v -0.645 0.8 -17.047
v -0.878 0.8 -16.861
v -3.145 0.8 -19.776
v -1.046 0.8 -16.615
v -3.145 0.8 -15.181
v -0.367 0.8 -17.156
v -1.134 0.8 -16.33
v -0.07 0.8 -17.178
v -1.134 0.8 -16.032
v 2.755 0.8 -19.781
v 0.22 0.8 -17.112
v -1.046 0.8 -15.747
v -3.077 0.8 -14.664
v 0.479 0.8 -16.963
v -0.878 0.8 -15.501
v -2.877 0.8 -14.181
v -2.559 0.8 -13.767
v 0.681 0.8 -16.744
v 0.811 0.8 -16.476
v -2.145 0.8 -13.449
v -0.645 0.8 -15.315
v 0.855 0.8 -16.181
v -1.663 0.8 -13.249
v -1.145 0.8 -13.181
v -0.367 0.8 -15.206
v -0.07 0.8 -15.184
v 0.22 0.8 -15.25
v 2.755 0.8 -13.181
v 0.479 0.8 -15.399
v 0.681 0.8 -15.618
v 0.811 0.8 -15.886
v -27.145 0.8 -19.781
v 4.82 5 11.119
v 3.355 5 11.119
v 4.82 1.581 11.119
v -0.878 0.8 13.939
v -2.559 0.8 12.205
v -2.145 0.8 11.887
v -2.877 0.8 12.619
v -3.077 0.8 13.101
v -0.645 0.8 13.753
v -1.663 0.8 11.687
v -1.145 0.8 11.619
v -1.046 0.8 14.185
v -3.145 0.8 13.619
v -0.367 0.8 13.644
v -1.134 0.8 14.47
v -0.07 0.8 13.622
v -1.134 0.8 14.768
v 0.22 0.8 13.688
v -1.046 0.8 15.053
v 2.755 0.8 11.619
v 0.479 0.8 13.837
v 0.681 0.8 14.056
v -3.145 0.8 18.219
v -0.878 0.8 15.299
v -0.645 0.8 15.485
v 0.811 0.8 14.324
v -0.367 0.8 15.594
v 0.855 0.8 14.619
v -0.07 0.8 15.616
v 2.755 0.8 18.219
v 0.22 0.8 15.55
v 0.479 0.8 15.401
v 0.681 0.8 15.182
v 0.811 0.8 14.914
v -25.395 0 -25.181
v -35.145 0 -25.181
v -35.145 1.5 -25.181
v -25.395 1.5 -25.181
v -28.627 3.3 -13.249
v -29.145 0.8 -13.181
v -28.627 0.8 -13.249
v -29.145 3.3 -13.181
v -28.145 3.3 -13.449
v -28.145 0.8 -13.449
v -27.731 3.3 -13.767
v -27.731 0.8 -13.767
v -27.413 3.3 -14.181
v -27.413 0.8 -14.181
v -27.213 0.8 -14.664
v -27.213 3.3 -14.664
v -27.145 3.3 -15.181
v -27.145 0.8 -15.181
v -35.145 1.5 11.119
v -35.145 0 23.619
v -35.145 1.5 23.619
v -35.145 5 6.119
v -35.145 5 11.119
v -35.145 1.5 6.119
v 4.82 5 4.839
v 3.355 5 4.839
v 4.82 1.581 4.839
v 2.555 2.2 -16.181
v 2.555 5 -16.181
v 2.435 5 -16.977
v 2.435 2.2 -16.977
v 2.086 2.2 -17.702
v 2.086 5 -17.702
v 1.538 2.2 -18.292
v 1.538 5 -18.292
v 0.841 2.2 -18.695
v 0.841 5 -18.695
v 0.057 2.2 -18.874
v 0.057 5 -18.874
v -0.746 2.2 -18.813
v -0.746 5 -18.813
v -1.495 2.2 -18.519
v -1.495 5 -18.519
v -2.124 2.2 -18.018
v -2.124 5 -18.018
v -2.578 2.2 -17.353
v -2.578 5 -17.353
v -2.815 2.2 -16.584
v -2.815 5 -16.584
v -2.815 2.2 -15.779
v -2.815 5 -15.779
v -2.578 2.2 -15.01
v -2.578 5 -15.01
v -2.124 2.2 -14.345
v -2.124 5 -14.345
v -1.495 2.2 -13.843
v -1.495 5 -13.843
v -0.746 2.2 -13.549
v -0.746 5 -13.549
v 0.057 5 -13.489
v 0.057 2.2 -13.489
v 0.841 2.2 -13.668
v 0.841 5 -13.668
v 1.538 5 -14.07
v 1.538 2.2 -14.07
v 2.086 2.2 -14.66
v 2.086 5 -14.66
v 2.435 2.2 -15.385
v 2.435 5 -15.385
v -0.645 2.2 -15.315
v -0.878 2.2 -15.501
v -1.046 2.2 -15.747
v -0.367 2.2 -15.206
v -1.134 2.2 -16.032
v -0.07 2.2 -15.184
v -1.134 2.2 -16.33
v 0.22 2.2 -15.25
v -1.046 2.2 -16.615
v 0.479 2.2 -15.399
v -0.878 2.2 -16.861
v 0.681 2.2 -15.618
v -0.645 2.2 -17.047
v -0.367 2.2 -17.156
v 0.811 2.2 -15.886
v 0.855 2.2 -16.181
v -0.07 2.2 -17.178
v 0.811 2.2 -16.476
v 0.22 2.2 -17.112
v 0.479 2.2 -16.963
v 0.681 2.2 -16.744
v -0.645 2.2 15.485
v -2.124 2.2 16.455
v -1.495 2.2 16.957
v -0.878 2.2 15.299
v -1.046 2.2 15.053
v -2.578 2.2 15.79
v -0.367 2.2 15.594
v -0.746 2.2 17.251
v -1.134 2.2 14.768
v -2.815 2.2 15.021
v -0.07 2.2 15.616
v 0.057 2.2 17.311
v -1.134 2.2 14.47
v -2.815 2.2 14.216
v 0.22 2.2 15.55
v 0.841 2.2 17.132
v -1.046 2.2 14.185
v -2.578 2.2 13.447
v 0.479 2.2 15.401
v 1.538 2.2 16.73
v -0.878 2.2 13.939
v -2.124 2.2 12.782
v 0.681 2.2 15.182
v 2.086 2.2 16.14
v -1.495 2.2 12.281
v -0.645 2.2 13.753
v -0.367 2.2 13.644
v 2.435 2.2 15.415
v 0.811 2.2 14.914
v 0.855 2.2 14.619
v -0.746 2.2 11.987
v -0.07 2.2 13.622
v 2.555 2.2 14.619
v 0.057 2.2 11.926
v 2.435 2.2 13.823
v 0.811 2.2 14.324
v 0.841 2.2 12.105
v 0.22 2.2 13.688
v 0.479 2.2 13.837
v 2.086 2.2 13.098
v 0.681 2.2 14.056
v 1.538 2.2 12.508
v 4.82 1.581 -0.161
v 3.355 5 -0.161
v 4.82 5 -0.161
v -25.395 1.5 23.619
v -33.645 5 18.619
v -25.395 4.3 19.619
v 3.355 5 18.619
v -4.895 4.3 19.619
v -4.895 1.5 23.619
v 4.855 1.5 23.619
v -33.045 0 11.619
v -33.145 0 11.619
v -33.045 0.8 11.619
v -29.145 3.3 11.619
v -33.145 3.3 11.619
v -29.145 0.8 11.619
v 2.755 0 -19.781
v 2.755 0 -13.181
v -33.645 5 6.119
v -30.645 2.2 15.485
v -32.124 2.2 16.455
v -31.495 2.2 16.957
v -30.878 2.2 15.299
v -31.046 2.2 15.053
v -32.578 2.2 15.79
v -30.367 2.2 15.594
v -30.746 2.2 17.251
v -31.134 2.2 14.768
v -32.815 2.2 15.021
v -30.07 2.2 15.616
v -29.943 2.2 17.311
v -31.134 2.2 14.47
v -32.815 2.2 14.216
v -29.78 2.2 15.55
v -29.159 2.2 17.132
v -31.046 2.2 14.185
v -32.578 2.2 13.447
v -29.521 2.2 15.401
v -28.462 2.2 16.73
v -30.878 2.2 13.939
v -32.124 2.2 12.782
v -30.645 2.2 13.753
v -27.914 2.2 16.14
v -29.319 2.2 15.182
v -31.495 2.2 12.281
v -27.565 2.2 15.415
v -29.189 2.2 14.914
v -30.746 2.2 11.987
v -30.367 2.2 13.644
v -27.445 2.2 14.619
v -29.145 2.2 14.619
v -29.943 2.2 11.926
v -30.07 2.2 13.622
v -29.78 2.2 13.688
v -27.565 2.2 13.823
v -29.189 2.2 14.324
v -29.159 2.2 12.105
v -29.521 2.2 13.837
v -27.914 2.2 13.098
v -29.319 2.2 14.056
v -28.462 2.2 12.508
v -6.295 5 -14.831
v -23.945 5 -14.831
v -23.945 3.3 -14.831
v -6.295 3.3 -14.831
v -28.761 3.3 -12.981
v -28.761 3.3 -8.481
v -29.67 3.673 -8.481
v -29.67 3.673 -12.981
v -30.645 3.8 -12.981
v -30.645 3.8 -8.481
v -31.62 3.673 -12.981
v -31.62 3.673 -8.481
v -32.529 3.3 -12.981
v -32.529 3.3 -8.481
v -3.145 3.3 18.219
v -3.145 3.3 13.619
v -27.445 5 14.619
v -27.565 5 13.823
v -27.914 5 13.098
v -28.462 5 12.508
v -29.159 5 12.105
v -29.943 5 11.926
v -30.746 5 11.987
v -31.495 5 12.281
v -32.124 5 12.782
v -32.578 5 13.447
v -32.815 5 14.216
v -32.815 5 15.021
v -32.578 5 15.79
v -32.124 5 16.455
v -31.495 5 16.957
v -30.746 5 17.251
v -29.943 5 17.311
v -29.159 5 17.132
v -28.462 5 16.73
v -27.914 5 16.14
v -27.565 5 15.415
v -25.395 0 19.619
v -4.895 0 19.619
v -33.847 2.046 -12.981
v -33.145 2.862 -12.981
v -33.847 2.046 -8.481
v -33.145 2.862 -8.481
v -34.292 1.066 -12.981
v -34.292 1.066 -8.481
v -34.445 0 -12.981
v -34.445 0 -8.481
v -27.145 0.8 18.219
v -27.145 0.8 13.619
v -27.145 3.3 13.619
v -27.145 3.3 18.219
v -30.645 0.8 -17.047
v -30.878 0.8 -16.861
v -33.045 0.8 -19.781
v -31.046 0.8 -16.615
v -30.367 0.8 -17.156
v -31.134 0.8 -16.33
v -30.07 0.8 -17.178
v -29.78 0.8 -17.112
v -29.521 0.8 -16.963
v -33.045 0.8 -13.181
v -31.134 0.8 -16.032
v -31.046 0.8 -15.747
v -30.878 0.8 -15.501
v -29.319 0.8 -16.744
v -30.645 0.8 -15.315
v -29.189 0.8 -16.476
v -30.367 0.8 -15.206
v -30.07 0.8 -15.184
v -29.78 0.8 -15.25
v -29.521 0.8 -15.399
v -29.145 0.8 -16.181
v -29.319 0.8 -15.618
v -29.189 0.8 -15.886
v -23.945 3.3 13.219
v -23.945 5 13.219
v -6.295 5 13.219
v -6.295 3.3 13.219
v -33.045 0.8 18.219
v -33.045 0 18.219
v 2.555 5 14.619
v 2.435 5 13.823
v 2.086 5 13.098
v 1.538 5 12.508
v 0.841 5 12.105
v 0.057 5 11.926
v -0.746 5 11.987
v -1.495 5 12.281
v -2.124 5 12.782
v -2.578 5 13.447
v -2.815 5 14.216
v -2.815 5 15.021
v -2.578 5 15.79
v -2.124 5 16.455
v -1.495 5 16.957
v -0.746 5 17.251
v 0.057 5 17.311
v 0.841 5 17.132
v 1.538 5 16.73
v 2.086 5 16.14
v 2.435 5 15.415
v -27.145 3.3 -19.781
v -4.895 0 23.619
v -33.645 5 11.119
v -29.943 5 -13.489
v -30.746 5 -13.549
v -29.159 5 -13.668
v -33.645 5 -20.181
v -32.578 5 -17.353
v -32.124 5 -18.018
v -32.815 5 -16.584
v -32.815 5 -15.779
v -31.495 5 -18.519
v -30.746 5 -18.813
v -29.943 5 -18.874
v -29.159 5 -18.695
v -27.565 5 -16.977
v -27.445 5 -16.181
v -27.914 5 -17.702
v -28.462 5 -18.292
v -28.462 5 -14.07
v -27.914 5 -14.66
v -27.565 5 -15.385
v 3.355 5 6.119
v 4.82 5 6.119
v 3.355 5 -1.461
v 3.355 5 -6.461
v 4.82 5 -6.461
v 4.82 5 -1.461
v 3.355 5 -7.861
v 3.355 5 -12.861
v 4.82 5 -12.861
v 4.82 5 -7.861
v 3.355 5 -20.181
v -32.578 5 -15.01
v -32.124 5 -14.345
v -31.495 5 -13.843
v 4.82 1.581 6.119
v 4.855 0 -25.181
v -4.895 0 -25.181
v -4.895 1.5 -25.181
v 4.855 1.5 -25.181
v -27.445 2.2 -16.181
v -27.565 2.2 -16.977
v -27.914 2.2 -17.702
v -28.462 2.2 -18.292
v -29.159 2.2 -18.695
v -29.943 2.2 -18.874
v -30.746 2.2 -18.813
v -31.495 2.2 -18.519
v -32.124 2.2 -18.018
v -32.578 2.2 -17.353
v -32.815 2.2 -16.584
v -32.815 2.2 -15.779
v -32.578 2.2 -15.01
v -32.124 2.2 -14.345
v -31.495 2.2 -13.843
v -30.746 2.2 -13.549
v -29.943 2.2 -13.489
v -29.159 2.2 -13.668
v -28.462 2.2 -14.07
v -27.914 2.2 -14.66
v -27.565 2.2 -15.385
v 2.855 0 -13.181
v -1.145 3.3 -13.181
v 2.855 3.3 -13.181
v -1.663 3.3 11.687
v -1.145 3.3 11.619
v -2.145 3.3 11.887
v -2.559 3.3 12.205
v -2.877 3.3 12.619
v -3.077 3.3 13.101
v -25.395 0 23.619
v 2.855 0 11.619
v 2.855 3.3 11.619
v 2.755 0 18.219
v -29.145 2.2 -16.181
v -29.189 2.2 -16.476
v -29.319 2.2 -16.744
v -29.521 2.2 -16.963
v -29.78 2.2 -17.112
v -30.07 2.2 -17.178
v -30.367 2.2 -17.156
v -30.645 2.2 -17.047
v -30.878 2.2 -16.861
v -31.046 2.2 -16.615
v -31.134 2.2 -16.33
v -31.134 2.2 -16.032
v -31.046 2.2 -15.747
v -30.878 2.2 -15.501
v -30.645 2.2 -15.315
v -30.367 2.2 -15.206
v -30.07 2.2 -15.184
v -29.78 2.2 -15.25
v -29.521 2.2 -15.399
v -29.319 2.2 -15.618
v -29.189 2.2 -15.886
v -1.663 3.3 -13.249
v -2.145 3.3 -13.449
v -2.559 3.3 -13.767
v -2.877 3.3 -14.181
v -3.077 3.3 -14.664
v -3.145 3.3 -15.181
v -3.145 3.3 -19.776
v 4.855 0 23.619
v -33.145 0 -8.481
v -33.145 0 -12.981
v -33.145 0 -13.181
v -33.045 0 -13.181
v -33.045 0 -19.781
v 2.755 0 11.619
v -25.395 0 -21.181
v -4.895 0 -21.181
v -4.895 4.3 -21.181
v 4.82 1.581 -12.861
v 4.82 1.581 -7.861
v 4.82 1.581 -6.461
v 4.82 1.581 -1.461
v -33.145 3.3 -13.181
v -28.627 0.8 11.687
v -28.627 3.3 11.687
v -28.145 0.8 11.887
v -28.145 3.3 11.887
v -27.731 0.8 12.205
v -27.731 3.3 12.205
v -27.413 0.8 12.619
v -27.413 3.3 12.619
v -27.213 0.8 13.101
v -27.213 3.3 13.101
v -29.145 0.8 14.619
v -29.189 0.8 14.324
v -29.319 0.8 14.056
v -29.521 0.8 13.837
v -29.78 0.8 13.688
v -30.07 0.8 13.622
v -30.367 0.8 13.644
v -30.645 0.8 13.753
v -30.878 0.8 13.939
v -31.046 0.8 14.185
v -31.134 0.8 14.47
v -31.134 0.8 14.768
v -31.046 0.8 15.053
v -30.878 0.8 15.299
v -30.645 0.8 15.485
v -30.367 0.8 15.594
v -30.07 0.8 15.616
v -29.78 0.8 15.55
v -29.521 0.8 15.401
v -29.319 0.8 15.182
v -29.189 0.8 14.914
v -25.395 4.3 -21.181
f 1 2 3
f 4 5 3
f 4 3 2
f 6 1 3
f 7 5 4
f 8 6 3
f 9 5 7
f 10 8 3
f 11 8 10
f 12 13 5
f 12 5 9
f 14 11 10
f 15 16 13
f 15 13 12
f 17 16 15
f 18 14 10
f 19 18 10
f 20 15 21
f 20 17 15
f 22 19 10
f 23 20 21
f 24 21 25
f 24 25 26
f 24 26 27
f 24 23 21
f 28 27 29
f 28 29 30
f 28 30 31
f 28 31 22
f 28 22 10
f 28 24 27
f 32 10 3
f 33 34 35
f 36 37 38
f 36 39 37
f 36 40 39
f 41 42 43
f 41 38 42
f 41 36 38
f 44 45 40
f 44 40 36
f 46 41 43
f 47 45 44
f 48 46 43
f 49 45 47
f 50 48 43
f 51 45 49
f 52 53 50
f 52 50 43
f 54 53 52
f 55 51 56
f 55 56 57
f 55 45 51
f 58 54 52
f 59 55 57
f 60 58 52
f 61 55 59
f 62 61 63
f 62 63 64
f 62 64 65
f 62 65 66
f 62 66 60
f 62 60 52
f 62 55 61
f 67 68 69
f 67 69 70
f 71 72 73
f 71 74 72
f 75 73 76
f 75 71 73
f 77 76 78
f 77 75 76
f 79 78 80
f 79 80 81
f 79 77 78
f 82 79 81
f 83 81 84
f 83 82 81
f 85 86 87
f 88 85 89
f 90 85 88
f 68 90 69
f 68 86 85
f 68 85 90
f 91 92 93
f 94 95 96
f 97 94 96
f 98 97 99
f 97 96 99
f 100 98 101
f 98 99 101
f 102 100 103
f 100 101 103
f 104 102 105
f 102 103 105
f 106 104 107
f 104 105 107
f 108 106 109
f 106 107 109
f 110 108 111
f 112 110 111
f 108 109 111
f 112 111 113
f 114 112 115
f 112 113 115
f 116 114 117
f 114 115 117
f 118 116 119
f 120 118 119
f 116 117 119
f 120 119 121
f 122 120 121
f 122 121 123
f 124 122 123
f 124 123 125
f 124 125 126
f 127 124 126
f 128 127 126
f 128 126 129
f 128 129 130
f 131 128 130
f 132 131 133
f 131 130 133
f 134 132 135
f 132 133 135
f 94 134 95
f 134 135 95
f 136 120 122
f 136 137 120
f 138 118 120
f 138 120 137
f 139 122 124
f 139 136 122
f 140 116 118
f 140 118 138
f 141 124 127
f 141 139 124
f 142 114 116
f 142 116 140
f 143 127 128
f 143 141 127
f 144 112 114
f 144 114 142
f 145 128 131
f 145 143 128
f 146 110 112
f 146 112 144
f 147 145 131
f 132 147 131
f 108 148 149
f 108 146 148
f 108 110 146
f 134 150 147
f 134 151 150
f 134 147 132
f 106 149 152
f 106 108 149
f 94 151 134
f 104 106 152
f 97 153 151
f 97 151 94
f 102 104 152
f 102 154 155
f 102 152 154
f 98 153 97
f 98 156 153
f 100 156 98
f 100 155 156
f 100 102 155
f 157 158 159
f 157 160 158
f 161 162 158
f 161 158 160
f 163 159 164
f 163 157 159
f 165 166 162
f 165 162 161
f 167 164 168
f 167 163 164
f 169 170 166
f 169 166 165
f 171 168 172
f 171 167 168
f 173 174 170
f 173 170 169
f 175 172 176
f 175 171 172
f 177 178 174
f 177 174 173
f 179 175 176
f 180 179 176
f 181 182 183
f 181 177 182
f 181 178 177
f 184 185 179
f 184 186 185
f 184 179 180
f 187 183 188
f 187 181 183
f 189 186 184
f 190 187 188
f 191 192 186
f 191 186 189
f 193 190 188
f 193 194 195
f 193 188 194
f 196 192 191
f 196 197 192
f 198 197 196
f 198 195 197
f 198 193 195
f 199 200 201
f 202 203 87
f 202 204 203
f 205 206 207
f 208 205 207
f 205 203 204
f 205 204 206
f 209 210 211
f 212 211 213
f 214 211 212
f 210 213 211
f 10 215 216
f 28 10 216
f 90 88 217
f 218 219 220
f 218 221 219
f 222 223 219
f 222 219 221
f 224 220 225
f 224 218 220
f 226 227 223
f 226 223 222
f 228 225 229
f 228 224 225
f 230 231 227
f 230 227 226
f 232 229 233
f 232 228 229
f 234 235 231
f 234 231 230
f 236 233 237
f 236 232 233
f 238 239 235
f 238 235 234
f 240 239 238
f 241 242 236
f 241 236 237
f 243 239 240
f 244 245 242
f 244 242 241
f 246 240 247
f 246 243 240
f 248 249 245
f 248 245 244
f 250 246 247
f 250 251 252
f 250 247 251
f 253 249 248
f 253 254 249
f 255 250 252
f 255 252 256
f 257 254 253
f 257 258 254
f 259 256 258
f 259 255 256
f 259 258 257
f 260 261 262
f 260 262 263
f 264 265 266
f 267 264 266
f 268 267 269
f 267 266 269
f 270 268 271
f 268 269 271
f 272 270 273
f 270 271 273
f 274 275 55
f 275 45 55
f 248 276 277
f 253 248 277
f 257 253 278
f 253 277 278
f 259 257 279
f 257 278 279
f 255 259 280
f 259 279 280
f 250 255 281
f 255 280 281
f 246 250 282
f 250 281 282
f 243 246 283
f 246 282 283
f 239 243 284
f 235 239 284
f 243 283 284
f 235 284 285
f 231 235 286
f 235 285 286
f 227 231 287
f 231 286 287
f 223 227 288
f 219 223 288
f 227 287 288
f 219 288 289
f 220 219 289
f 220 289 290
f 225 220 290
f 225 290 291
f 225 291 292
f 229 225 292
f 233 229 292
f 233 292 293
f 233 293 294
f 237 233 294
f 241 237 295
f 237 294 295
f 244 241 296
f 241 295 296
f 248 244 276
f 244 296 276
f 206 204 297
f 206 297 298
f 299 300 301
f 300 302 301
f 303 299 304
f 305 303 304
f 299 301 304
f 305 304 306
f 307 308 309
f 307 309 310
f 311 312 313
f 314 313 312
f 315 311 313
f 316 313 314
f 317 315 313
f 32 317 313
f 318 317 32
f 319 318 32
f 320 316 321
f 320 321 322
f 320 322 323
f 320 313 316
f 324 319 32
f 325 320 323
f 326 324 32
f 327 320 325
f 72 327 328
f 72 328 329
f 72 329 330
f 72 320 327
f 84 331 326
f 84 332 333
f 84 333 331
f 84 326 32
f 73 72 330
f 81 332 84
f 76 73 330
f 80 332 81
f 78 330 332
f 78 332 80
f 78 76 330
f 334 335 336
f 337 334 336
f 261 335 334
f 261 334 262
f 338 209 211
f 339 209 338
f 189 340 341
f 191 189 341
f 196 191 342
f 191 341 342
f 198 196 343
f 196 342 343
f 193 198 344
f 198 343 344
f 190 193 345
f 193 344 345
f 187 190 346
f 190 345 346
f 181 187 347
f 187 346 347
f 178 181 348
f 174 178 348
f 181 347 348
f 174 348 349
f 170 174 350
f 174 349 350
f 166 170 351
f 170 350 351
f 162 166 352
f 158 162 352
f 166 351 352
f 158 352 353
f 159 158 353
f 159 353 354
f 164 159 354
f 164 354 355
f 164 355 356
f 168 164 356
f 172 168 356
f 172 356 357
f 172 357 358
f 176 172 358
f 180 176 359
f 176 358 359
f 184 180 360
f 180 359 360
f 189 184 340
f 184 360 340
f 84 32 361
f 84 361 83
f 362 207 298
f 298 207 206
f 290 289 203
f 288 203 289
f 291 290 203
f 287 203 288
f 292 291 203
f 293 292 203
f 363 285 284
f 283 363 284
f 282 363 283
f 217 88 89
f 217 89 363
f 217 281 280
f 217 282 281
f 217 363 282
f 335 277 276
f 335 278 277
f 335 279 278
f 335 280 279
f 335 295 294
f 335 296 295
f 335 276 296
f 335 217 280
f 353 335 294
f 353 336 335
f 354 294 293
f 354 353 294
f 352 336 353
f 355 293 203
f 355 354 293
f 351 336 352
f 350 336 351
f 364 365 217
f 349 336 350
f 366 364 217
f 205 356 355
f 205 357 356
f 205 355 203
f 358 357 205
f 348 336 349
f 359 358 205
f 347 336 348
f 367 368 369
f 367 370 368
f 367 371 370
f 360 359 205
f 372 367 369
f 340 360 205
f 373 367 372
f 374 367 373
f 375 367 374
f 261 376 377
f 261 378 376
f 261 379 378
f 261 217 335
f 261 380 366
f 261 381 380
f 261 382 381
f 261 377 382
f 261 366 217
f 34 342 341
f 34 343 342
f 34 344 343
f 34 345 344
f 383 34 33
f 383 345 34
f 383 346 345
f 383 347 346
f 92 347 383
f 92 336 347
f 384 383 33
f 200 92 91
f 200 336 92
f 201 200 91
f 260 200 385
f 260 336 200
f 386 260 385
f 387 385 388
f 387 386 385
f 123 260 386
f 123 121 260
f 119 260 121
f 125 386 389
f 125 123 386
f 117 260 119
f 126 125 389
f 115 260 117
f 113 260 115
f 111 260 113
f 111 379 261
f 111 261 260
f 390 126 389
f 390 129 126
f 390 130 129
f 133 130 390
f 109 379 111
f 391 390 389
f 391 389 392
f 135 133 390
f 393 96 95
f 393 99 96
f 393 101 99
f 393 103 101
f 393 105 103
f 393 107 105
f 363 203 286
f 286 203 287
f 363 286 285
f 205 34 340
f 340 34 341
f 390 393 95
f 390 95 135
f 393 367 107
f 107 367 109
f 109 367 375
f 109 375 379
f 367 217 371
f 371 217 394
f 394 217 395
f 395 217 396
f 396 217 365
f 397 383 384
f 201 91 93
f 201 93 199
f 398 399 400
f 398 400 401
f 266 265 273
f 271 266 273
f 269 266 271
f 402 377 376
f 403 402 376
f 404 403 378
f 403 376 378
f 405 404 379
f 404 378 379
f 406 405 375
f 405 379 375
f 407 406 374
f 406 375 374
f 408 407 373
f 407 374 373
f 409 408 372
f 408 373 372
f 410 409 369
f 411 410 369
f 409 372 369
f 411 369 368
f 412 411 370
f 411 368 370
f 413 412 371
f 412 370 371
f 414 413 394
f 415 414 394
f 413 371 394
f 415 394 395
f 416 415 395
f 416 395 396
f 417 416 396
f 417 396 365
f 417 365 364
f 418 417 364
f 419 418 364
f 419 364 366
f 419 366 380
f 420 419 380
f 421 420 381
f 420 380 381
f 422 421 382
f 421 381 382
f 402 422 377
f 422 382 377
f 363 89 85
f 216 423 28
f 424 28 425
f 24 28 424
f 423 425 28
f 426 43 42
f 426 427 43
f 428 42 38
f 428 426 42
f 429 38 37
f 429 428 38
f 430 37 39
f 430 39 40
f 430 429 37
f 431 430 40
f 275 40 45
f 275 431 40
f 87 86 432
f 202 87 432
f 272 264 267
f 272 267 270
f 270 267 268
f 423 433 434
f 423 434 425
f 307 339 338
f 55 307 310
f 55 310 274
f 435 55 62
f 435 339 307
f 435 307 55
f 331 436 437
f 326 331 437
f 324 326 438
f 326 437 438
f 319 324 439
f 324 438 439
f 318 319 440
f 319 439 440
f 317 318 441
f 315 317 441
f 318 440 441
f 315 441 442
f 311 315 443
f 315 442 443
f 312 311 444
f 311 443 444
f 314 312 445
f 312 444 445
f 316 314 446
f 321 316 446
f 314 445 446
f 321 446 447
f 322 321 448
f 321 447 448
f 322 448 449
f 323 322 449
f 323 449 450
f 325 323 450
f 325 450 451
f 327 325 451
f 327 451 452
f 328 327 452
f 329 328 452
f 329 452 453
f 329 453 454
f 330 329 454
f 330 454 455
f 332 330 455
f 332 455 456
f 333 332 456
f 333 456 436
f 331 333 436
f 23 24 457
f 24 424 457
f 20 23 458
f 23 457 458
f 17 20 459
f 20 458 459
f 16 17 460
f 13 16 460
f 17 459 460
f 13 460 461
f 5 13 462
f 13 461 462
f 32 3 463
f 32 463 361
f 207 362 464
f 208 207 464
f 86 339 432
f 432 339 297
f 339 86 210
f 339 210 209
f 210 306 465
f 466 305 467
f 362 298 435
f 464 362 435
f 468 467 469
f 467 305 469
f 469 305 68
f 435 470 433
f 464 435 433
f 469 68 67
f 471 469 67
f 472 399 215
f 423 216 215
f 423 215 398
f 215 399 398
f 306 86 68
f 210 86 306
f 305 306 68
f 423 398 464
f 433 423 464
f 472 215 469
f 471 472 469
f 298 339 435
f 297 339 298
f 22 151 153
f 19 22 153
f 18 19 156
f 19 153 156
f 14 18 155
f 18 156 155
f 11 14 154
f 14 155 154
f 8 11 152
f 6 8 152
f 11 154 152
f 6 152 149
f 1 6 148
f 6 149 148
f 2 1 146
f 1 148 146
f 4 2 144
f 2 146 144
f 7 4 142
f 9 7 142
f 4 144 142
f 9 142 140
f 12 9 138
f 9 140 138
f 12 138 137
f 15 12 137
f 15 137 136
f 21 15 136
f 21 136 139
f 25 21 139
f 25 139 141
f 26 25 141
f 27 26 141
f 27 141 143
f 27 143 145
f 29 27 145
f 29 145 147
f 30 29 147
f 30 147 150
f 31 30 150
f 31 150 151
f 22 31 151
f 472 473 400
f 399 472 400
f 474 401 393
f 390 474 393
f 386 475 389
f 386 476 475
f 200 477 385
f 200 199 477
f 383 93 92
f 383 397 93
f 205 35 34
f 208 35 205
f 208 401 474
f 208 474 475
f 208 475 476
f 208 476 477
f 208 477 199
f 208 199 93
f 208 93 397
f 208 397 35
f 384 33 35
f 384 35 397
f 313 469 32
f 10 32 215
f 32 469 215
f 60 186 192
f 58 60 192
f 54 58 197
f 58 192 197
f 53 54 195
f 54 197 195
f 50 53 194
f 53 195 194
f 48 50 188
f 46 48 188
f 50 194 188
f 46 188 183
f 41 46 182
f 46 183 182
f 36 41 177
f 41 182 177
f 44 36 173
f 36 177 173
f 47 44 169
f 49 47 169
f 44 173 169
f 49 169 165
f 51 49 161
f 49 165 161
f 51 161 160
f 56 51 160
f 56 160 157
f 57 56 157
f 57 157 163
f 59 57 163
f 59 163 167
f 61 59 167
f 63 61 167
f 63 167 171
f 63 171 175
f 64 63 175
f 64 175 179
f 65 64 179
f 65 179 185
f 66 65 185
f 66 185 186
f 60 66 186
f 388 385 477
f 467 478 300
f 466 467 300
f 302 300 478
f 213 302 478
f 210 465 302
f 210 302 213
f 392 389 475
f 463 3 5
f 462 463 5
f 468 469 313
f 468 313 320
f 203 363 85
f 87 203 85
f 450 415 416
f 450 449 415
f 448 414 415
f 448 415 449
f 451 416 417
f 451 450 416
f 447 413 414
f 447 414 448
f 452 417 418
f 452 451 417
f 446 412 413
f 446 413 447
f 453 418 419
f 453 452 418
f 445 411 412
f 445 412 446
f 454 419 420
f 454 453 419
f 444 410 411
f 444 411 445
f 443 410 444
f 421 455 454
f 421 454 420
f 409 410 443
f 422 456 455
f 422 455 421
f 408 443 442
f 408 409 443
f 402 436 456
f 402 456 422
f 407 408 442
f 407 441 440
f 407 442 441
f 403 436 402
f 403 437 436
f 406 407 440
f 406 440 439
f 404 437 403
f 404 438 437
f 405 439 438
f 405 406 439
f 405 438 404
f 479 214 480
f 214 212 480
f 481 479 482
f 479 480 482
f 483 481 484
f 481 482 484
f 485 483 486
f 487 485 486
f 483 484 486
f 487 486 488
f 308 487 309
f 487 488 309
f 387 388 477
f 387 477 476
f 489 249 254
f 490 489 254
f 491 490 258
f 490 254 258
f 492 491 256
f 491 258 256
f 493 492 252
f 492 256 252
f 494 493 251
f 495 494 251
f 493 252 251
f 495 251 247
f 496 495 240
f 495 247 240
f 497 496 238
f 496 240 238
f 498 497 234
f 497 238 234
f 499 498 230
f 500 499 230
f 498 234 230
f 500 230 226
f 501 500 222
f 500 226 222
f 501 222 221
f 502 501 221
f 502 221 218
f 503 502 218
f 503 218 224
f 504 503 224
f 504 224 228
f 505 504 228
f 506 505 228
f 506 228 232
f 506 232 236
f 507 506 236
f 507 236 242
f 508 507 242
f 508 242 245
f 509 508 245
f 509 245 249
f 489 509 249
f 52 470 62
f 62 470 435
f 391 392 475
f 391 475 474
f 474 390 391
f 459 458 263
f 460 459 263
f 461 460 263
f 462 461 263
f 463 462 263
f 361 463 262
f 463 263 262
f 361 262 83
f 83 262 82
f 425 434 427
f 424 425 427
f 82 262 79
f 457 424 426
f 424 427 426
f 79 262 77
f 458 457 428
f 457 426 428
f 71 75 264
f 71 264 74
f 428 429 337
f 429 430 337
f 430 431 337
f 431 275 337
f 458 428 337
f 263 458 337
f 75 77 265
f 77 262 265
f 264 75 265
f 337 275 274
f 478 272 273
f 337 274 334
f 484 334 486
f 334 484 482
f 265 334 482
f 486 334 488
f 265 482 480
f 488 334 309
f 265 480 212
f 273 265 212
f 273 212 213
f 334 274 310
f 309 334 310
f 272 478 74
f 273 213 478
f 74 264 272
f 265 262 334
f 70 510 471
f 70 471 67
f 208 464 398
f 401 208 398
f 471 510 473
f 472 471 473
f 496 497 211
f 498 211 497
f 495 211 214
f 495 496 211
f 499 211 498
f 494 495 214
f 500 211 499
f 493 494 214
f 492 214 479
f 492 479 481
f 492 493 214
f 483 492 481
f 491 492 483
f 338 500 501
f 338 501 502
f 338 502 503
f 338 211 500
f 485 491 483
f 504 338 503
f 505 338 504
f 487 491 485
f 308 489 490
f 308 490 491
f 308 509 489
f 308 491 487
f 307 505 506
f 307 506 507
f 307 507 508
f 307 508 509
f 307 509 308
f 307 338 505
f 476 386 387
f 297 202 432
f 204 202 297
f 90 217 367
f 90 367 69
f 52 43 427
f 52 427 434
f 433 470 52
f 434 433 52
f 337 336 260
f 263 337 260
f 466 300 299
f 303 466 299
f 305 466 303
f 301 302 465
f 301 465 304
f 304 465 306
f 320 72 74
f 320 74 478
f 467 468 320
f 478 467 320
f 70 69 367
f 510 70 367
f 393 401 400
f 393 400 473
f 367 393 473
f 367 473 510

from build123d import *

# Parameters (mm, degrees)
SKETCH1_W            = 40
SKETCH1_H            = 48.8
BOSS_EXTRUDE1_DEPTH  = 5
SKETCH2_W            = 20.5
SKETCH2_H            = 8
CUT_EXTRUDE1_DEPTH   = 6
SKETCH3_R            = 2.7
CUT_EXTRUDE2_DEPTH   = 2.8
SKETCH5_R            = 1
CUT_EXTRUDE3_DEPTH   = 6
SKETCH6_OUTSIDE_W    = 63.46
SKETCH6_OUTSIDE_H    = 19.66
CUT_EXTRUDE4_DEPTH   = 41
SKETCH7_OUTSIDE_W    = 54.66
SKETCH7_OUTSIDE_H    = 19.66
CUT_EXTRUDE5_DEPTH   = 49.8
SKETCH8_W            = 17.65
SKETCH8_H            = 28.05
CUT_EXTRUDE6_DEPTH   = 6
BOSS_EXTRUDE2_REACH  = 7
SKETCH9_W            = 2.93050761
SKETCH9_H            = 5
SKETCH9_W_2          = 3
SKETCH10_W           = 35.8
SKETCH10_H           = 38
CUT_EXTRUDE7_DEPTH   = 0.8
SKETCH11_W           = 36
SKETCH11_H           = 24
CUT_EXTRUDE8_DEPTH   = 2.8
SKETCH12_W           = 4
SKETCH12_H           = 26.7
CUT_EXTRUDE9_DEPTH   = 3.3
SKETCH13_OUTSIDE_W   = 54.66
SKETCH13_OUTSIDE_H   = 63.46
SKETCH13_OUTSIDE_W_2 = 40
SKETCH13_OUTSIDE_H_2 = 48.8
CUT_EXTRUDE10_DEPTH  = 3.3
SKETCH14_W           = 3.8
SKETCH14_H           = 4.5
FILLET1_R            = 2


with BuildPart() as part:
    # Sketch1 → Boss-Extrude1 (new body)
    with BuildSketch(Plane(origin=(0, 0, 0), x_dir=(1, 0, 0), z_dir=(0, 1, 0))):
        with Locations((-15.144927536, 0.78115942)):
            Rectangle(SKETCH1_W, SKETCH1_H)
    extrude(amount=BOSS_EXTRUDE1_DEPTH)

    # Sketch2 → Cut-Extrude1 (cut, through all)
    with BuildSketch(Plane(origin=(0, 5, 0), x_dir=(1, 0, 0), z_dir=(0, 1, 0))):
        with Locations((-15.144927536, -23.61884058)):
            Rectangle(SKETCH2_W, SKETCH2_H)
        with Locations((-15.144927536, 25.18115942)):
            Rectangle(SKETCH2_W, SKETCH2_H)
    extrude(amount=-CUT_EXTRUDE1_DEPTH, mode=Mode.SUBTRACT)

    # Sketch3 → Cut-Extrude2 (cut)
    with BuildSketch(Plane(origin=(0, 5, 0), x_dir=(1, 0, 0), z_dir=(0, 1, 0))):
        with Locations((-30.144927536, 16.18115942)):
            Circle(SKETCH3_R)
        with Locations((-0.144927536, 16.18115942)):
            Circle(SKETCH3_R)
        with Locations((-30.144927536, -14.61884058)):
            Circle(SKETCH3_R)
        with Locations((-0.144927536, -14.61884058)):
            Circle(SKETCH3_R)
    extrude(amount=-CUT_EXTRUDE2_DEPTH, mode=Mode.SUBTRACT)

    # Sketch5 → Cut-Extrude3 (cut, through all)
    with BuildSketch(Plane(origin=(0, 5, 0), x_dir=(1, 0, 0), z_dir=(0, 1, 0))):
        with Locations((-30.144927536, -14.61884058)):
            Circle(SKETCH5_R)
        with Locations((-0.144927536, -14.61884058)):
            Circle(SKETCH5_R)
        with Locations((-0.144927536, 16.18115942)):
            Circle(SKETCH5_R)
        with Locations((-30.144927536, 16.18115942)):
            Circle(SKETCH5_R)
    extrude(amount=-CUT_EXTRUDE3_DEPTH, mode=Mode.SUBTRACT)

    # Sketch6 outside → Cut-Extrude4 (cut, through all)
    with BuildSketch(Plane(origin=(4.855072464, 0, 0), x_dir=(0, 0, -1), z_dir=(1, 0, 0))):
        with Locations((0.781, 2.5)):
            Rectangle(SKETCH6_OUTSIDE_W, SKETCH6_OUTSIDE_H)
        Polygon((-18.61884058, 5), (-23.61884058, 1.5), (-23.61884058, 0), (25.18115942, 0), (25.18115942, 1.5), (20.18115942, 5), align=None, mode=Mode.SUBTRACT)
    extrude(amount=-CUT_EXTRUDE4_DEPTH, mode=Mode.SUBTRACT)

    # Sketch7 outside → Cut-Extrude5 (cut, through all)
    with BuildSketch(Plane.XY.offset(23.61884058)):
        with Locations((-15.145, 2.5)):
            Rectangle(SKETCH7_OUTSIDE_W, SKETCH7_OUTSIDE_H)
        Polygon((4.855072464, 1.5), (3.355072464, 5), (-33.644927536, 5), (-35.144927536, 1.5), (-35.144927536, 0), (4.855072464, 0), align=None, mode=Mode.SUBTRACT)
    extrude(amount=-CUT_EXTRUDE5_DEPTH, mode=Mode.SUBTRACT)

    # Sketch8 → Cut-Extrude6 (cut, through all)
    with BuildSketch(Plane(origin=(0, 5, 0), x_dir=(1, 0, 0), z_dir=(0, 1, 0))):
        with Locations((-15.119927536, 0.80615942)):
            Rectangle(SKETCH8_W, SKETCH8_H)
    extrude(amount=-CUT_EXTRUDE6_DEPTH, mode=Mode.SUBTRACT)

    # Sketch9 → Boss-Extrude2 (add, up to next)
    with BuildSketch(Plane(origin=(0, 5, 0), x_dir=(1, 0, 0), z_dir=(0, 1, 0)), mode=Mode.PRIVATE) as boss_extrude2_sk1:
        with Locations((3.355072464, 10.36115942)):
            Rectangle(SKETCH9_W, SKETCH9_H)
    boss_extrude2_tool1 = extrude(boss_extrude2_sk1.sketch, amount=-BOSS_EXTRUDE2_REACH, mode=Mode.PRIVATE) - part.part
    add(boss_extrude2_tool1.solids().sort_by_distance((3.355072, 5, -10.361159))[0])
    # Sketch9 → Boss-Extrude2 (add, up to next)
    with BuildSketch(Plane(origin=(0, 5, 0), x_dir=(1, 0, 0), z_dir=(0, 1, 0)), mode=Mode.PRIVATE) as boss_extrude2_sk2:
        with Locations((3.355072464, 3.96115942)):
            Rectangle(SKETCH9_W, SKETCH9_H)
    boss_extrude2_tool2 = extrude(boss_extrude2_sk2.sketch, amount=-BOSS_EXTRUDE2_REACH, mode=Mode.PRIVATE) - part.part
    add(boss_extrude2_tool2.solids().sort_by_distance((3.355072, 5, -3.961159))[0])
    # Sketch9 → Boss-Extrude2 (add, up to next)
    with BuildSketch(Plane(origin=(0, 5, 0), x_dir=(1, 0, 0), z_dir=(0, 1, 0)), mode=Mode.PRIVATE) as boss_extrude2_sk3:
        with Locations((3.355072464, -2.33884058)):
            Rectangle(SKETCH9_W, SKETCH9_H)
    boss_extrude2_tool3 = extrude(boss_extrude2_sk3.sketch, amount=-BOSS_EXTRUDE2_REACH, mode=Mode.PRIVATE) - part.part
    add(boss_extrude2_tool3.solids().sort_by_distance((3.355072, 5, 2.338841))[0])
    # Sketch9 → Boss-Extrude2 (add, up to next)
    with BuildSketch(Plane(origin=(0, 5, 0), x_dir=(1, 0, 0), z_dir=(0, 1, 0)), mode=Mode.PRIVATE) as boss_extrude2_sk4:
        with Locations((3.355072464, -8.61884058)):
            Rectangle(SKETCH9_W, SKETCH9_H)
    boss_extrude2_tool4 = extrude(boss_extrude2_sk4.sketch, amount=-BOSS_EXTRUDE2_REACH, mode=Mode.PRIVATE) - part.part
    add(boss_extrude2_tool4.solids().sort_by_distance((3.355072, 5, 8.618841))[0])
    # Sketch9 → Boss-Extrude2 (add, up to next)
    with BuildSketch(Plane(origin=(0, 5, 0), x_dir=(1, 0, 0), z_dir=(0, 1, 0)), mode=Mode.PRIVATE) as boss_extrude2_sk5:
        with Locations((-33.644927536, -8.61884058)):
            Rectangle(SKETCH9_W_2, SKETCH9_H)
    boss_extrude2_tool5 = extrude(boss_extrude2_sk5.sketch, amount=-BOSS_EXTRUDE2_REACH, mode=Mode.PRIVATE) - part.part
    add(boss_extrude2_tool5.solids().sort_by_distance((-33.644928, 5, 8.618841))[0])

    # Sketch10 → Cut-Extrude7 (cut)
    with BuildSketch(Plane.XZ):
        with Locations((-15.144927536, -0.78115942)):
            Rectangle(SKETCH10_W, SKETCH10_H)
    extrude(amount=-CUT_EXTRUDE7_DEPTH, mode=Mode.SUBTRACT)

    # Sketch11 → Cut-Extrude8 (cut)
    with BuildSketch(Plane.XZ):
        with Locations((-15.144927536, -0.78115942)):
            Rectangle(SKETCH11_W, SKETCH11_H)
    extrude(amount=-CUT_EXTRUDE8_DEPTH, mode=Mode.SUBTRACT)

    # Sketch12 → Cut-Extrude9 (cut)
    with BuildSketch(Plane.XZ):
        with Locations((-5.144927536, -0.93115942)):
            Rectangle(SKETCH12_W, SKETCH12_H)
    extrude(amount=-CUT_EXTRUDE9_DEPTH, mode=Mode.SUBTRACT)

    # Sketch13 outside → Cut-Extrude10 (cut)
    with BuildSketch(Plane.XZ):
        with Locations((-15.145, -0.781)):
            Rectangle(SKETCH13_OUTSIDE_W, SKETCH13_OUTSIDE_H)
        with Locations((-15.144927536, -0.78115942)):
            Rectangle(SKETCH13_OUTSIDE_W_2, SKETCH13_OUTSIDE_H_2, mode=Mode.SUBTRACT)
        Polygon((2.855072464, -13.18115942), (-3.144927536, -13.18115942), (-3.144927536, -19.776149343), (-27.144927536, -19.78115942), (-27.144927536, -13.18115942), (-33.144927536, -13.18115942), (-33.144927536, 11.61884058), (-27.144927536, 11.61884058), (-27.144927536, 18.21884058), (-3.144927536, 18.21884058), (-3.144927536, 11.61884058), (2.855072464, 11.61884058), align=None)
    extrude(amount=-CUT_EXTRUDE10_DEPTH, mode=Mode.SUBTRACT)

    # Sketch14 → Cut-Revolve1 (revolve, cut)
    with BuildSketch(Plane.XZ):
        with Locations((-32.544927536, -10.73115942)):
            Rectangle(SKETCH14_W, SKETCH14_H)
    revolve(axis=Axis((-30.644927536, 0, -16.414338521), (0, 0, 1)), mode=Mode.SUBTRACT)

    # Fillet1
    fillet1_edges = [part.edges().sort_by_distance(p)[0] for p in [
        (-3.144927536, 2.05, -13.18115942),
        (-27.144927536, 2.05, -13.18115942),
        (-27.144927536, 2.05, 11.61884058),
        (-3.144927536, 2.05, 11.61884058),
    ]]
    fillet(fillet1_edges, radius=FILLET1_R)


solid = part.part
